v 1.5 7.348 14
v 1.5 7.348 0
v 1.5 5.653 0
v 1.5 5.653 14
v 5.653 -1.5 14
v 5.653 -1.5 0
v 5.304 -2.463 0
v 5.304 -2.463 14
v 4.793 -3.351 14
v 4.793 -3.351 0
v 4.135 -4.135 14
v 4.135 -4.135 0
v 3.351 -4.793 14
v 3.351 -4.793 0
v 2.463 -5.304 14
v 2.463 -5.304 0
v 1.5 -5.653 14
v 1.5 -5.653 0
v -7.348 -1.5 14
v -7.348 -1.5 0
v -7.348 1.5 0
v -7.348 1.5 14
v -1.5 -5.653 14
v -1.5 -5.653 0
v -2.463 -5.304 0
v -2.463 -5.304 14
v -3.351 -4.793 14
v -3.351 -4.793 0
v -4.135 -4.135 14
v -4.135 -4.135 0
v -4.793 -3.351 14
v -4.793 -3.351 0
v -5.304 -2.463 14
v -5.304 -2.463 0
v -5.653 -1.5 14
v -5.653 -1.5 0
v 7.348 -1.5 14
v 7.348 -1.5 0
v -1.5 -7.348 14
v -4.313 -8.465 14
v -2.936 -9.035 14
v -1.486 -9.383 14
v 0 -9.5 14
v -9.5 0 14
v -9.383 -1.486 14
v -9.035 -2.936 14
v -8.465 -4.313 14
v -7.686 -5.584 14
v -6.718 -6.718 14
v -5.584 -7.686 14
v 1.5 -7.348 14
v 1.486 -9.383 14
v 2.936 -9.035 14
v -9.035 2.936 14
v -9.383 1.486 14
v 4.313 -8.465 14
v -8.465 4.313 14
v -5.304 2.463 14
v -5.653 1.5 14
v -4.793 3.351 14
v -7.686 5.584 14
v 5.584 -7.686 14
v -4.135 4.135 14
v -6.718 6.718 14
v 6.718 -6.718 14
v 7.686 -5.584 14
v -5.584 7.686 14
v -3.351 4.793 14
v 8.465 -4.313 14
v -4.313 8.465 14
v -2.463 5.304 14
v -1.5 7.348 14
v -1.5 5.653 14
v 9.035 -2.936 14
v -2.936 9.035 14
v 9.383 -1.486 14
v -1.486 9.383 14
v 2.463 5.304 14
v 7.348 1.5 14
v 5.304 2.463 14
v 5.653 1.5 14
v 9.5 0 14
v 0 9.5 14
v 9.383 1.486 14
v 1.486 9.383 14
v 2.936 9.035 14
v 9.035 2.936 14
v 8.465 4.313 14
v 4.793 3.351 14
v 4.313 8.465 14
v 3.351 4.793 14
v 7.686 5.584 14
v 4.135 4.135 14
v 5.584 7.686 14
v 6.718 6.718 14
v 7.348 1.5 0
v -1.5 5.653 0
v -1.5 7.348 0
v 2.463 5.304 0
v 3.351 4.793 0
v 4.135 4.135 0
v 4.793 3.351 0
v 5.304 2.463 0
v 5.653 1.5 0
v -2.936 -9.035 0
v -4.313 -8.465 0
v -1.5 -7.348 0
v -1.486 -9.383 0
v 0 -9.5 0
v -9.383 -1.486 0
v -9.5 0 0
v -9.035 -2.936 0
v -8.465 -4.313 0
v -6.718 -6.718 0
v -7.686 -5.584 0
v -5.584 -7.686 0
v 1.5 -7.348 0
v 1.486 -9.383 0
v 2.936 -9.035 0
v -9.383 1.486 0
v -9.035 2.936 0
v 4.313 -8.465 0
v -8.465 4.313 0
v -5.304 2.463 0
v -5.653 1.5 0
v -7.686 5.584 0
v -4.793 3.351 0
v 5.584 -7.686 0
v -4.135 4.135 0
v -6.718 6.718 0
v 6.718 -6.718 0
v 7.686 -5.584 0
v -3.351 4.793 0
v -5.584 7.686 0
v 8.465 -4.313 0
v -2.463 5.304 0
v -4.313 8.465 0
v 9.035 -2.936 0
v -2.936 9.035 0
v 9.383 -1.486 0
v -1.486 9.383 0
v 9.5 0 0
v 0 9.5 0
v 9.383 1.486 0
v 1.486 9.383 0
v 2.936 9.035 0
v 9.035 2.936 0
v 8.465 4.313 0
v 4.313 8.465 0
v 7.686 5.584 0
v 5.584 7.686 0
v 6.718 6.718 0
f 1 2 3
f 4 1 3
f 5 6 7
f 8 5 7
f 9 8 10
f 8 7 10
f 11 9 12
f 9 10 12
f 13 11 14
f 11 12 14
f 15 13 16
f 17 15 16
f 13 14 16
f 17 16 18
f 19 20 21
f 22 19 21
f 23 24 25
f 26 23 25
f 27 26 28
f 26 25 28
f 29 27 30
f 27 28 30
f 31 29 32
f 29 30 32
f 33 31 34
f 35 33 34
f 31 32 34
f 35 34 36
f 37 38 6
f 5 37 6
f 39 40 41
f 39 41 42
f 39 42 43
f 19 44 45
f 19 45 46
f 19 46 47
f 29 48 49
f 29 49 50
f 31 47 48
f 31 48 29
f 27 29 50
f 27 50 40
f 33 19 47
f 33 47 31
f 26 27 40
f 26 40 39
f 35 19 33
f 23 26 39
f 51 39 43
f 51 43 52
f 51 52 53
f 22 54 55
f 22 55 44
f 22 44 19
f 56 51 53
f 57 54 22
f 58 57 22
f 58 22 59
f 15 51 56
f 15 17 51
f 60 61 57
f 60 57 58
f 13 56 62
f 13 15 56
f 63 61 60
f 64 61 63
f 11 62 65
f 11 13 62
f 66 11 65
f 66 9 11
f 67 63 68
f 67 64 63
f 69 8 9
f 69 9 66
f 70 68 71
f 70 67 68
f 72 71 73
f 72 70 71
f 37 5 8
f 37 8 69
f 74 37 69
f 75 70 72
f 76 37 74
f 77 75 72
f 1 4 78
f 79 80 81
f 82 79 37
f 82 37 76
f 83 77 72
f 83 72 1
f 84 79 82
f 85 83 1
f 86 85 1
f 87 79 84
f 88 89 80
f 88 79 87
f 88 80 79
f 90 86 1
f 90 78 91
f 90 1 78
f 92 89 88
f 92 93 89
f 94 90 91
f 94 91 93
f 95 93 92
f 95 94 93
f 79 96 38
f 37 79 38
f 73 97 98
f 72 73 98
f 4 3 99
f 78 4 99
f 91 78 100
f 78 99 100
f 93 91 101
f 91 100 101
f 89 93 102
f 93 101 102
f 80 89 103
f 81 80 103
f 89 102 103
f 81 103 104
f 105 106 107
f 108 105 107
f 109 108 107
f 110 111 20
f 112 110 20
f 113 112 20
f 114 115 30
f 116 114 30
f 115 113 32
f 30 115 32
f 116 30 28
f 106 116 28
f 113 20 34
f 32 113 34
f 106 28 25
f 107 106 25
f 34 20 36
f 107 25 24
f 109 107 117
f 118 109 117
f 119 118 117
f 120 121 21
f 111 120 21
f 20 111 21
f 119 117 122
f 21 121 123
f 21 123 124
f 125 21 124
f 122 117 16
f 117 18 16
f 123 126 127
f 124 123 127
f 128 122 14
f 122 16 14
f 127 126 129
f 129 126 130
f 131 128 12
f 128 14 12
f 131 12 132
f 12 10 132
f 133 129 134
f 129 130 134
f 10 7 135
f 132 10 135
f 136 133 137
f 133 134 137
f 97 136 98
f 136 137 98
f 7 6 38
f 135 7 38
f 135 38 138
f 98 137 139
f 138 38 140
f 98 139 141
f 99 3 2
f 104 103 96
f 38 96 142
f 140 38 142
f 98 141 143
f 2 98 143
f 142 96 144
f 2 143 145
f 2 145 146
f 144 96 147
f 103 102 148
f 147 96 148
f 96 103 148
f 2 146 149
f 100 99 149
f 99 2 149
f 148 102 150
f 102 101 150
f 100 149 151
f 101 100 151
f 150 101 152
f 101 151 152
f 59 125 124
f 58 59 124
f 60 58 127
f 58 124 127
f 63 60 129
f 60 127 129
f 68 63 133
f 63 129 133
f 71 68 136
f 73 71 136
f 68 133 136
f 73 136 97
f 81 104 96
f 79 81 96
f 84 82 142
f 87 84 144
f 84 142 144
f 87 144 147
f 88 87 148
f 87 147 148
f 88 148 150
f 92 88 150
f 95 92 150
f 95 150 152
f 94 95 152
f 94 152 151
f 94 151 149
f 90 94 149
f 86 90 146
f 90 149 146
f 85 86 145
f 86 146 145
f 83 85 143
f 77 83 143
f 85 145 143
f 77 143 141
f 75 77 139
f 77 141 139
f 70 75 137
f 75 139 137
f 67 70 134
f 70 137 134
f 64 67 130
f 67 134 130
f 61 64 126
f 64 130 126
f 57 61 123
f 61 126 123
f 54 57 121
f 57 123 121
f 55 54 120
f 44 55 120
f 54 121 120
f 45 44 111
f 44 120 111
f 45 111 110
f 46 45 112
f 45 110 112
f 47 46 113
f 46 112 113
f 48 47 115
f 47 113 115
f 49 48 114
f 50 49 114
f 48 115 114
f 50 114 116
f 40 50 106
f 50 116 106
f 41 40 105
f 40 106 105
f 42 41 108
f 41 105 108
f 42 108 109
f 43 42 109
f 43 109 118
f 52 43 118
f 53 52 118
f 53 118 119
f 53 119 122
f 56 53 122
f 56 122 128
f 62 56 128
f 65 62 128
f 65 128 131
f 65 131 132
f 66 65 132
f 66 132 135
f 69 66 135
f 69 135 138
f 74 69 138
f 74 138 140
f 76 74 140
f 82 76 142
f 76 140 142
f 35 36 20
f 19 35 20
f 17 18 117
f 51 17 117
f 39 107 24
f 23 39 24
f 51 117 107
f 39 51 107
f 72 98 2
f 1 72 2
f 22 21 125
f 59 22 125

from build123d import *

# Parameters (mm, degrees)
SKETCH1_R           = 9.5
BOSS_EXTRUDE1_DEPTH = 14


with BuildPart() as part:
    # Sketch1 → Boss-Extrude1 (new body)
    with BuildSketch(Plane.XY):
        Circle(SKETCH1_R)
        with BuildLine():
            Line((-1.5, 5.652839314), (-1.5, 7.348469228))
            Line((-1.5, 7.348469228), (1.5, 7.348469228))
            Line((1.5, 7.348469228), (1.5, 5.652839314))
            ThreePointArc((1.5, 5.652839314), (4.135492251, 4.135492251), (5.652839314, 1.5))
            Line((5.652839314, 1.5), (7.348469228, 1.5))
            Line((7.348469228, 1.5), (7.348469228, -1.5))
            Line((7.348469228, -1.5), (5.652839314, -1.5))
            ThreePointArc((5.652839314, -1.5), (4.135492251, -4.135492251), (1.5, -5.652839314))
            Line((1.5, -5.652839314), (1.5, -7.348469228))
            Line((1.5, -7.348469228), (-1.5, -7.348469228))
            Line((-1.5, -7.348469228), (-1.5, -5.652839314))
            ThreePointArc((-1.5, -5.652839314), (-4.135492251, -4.135492251), (-5.652839314, -1.5))
            Line((-5.652839314, -1.5), (-7.348469228, -1.5))
            Line((-7.348469228, -1.5), (-7.348469228, 1.5))
            Line((-7.348469228, 1.5), (-5.652839314, 1.5))
            ThreePointArc((-5.652839314, 1.5), (-4.135492251, 4.135492251), (-1.5, 5.652839314))
        make_face(mode=Mode.SUBTRACT)
    extrude(amount=BOSS_EXTRUDE1_DEPTH)


solid = part.part
